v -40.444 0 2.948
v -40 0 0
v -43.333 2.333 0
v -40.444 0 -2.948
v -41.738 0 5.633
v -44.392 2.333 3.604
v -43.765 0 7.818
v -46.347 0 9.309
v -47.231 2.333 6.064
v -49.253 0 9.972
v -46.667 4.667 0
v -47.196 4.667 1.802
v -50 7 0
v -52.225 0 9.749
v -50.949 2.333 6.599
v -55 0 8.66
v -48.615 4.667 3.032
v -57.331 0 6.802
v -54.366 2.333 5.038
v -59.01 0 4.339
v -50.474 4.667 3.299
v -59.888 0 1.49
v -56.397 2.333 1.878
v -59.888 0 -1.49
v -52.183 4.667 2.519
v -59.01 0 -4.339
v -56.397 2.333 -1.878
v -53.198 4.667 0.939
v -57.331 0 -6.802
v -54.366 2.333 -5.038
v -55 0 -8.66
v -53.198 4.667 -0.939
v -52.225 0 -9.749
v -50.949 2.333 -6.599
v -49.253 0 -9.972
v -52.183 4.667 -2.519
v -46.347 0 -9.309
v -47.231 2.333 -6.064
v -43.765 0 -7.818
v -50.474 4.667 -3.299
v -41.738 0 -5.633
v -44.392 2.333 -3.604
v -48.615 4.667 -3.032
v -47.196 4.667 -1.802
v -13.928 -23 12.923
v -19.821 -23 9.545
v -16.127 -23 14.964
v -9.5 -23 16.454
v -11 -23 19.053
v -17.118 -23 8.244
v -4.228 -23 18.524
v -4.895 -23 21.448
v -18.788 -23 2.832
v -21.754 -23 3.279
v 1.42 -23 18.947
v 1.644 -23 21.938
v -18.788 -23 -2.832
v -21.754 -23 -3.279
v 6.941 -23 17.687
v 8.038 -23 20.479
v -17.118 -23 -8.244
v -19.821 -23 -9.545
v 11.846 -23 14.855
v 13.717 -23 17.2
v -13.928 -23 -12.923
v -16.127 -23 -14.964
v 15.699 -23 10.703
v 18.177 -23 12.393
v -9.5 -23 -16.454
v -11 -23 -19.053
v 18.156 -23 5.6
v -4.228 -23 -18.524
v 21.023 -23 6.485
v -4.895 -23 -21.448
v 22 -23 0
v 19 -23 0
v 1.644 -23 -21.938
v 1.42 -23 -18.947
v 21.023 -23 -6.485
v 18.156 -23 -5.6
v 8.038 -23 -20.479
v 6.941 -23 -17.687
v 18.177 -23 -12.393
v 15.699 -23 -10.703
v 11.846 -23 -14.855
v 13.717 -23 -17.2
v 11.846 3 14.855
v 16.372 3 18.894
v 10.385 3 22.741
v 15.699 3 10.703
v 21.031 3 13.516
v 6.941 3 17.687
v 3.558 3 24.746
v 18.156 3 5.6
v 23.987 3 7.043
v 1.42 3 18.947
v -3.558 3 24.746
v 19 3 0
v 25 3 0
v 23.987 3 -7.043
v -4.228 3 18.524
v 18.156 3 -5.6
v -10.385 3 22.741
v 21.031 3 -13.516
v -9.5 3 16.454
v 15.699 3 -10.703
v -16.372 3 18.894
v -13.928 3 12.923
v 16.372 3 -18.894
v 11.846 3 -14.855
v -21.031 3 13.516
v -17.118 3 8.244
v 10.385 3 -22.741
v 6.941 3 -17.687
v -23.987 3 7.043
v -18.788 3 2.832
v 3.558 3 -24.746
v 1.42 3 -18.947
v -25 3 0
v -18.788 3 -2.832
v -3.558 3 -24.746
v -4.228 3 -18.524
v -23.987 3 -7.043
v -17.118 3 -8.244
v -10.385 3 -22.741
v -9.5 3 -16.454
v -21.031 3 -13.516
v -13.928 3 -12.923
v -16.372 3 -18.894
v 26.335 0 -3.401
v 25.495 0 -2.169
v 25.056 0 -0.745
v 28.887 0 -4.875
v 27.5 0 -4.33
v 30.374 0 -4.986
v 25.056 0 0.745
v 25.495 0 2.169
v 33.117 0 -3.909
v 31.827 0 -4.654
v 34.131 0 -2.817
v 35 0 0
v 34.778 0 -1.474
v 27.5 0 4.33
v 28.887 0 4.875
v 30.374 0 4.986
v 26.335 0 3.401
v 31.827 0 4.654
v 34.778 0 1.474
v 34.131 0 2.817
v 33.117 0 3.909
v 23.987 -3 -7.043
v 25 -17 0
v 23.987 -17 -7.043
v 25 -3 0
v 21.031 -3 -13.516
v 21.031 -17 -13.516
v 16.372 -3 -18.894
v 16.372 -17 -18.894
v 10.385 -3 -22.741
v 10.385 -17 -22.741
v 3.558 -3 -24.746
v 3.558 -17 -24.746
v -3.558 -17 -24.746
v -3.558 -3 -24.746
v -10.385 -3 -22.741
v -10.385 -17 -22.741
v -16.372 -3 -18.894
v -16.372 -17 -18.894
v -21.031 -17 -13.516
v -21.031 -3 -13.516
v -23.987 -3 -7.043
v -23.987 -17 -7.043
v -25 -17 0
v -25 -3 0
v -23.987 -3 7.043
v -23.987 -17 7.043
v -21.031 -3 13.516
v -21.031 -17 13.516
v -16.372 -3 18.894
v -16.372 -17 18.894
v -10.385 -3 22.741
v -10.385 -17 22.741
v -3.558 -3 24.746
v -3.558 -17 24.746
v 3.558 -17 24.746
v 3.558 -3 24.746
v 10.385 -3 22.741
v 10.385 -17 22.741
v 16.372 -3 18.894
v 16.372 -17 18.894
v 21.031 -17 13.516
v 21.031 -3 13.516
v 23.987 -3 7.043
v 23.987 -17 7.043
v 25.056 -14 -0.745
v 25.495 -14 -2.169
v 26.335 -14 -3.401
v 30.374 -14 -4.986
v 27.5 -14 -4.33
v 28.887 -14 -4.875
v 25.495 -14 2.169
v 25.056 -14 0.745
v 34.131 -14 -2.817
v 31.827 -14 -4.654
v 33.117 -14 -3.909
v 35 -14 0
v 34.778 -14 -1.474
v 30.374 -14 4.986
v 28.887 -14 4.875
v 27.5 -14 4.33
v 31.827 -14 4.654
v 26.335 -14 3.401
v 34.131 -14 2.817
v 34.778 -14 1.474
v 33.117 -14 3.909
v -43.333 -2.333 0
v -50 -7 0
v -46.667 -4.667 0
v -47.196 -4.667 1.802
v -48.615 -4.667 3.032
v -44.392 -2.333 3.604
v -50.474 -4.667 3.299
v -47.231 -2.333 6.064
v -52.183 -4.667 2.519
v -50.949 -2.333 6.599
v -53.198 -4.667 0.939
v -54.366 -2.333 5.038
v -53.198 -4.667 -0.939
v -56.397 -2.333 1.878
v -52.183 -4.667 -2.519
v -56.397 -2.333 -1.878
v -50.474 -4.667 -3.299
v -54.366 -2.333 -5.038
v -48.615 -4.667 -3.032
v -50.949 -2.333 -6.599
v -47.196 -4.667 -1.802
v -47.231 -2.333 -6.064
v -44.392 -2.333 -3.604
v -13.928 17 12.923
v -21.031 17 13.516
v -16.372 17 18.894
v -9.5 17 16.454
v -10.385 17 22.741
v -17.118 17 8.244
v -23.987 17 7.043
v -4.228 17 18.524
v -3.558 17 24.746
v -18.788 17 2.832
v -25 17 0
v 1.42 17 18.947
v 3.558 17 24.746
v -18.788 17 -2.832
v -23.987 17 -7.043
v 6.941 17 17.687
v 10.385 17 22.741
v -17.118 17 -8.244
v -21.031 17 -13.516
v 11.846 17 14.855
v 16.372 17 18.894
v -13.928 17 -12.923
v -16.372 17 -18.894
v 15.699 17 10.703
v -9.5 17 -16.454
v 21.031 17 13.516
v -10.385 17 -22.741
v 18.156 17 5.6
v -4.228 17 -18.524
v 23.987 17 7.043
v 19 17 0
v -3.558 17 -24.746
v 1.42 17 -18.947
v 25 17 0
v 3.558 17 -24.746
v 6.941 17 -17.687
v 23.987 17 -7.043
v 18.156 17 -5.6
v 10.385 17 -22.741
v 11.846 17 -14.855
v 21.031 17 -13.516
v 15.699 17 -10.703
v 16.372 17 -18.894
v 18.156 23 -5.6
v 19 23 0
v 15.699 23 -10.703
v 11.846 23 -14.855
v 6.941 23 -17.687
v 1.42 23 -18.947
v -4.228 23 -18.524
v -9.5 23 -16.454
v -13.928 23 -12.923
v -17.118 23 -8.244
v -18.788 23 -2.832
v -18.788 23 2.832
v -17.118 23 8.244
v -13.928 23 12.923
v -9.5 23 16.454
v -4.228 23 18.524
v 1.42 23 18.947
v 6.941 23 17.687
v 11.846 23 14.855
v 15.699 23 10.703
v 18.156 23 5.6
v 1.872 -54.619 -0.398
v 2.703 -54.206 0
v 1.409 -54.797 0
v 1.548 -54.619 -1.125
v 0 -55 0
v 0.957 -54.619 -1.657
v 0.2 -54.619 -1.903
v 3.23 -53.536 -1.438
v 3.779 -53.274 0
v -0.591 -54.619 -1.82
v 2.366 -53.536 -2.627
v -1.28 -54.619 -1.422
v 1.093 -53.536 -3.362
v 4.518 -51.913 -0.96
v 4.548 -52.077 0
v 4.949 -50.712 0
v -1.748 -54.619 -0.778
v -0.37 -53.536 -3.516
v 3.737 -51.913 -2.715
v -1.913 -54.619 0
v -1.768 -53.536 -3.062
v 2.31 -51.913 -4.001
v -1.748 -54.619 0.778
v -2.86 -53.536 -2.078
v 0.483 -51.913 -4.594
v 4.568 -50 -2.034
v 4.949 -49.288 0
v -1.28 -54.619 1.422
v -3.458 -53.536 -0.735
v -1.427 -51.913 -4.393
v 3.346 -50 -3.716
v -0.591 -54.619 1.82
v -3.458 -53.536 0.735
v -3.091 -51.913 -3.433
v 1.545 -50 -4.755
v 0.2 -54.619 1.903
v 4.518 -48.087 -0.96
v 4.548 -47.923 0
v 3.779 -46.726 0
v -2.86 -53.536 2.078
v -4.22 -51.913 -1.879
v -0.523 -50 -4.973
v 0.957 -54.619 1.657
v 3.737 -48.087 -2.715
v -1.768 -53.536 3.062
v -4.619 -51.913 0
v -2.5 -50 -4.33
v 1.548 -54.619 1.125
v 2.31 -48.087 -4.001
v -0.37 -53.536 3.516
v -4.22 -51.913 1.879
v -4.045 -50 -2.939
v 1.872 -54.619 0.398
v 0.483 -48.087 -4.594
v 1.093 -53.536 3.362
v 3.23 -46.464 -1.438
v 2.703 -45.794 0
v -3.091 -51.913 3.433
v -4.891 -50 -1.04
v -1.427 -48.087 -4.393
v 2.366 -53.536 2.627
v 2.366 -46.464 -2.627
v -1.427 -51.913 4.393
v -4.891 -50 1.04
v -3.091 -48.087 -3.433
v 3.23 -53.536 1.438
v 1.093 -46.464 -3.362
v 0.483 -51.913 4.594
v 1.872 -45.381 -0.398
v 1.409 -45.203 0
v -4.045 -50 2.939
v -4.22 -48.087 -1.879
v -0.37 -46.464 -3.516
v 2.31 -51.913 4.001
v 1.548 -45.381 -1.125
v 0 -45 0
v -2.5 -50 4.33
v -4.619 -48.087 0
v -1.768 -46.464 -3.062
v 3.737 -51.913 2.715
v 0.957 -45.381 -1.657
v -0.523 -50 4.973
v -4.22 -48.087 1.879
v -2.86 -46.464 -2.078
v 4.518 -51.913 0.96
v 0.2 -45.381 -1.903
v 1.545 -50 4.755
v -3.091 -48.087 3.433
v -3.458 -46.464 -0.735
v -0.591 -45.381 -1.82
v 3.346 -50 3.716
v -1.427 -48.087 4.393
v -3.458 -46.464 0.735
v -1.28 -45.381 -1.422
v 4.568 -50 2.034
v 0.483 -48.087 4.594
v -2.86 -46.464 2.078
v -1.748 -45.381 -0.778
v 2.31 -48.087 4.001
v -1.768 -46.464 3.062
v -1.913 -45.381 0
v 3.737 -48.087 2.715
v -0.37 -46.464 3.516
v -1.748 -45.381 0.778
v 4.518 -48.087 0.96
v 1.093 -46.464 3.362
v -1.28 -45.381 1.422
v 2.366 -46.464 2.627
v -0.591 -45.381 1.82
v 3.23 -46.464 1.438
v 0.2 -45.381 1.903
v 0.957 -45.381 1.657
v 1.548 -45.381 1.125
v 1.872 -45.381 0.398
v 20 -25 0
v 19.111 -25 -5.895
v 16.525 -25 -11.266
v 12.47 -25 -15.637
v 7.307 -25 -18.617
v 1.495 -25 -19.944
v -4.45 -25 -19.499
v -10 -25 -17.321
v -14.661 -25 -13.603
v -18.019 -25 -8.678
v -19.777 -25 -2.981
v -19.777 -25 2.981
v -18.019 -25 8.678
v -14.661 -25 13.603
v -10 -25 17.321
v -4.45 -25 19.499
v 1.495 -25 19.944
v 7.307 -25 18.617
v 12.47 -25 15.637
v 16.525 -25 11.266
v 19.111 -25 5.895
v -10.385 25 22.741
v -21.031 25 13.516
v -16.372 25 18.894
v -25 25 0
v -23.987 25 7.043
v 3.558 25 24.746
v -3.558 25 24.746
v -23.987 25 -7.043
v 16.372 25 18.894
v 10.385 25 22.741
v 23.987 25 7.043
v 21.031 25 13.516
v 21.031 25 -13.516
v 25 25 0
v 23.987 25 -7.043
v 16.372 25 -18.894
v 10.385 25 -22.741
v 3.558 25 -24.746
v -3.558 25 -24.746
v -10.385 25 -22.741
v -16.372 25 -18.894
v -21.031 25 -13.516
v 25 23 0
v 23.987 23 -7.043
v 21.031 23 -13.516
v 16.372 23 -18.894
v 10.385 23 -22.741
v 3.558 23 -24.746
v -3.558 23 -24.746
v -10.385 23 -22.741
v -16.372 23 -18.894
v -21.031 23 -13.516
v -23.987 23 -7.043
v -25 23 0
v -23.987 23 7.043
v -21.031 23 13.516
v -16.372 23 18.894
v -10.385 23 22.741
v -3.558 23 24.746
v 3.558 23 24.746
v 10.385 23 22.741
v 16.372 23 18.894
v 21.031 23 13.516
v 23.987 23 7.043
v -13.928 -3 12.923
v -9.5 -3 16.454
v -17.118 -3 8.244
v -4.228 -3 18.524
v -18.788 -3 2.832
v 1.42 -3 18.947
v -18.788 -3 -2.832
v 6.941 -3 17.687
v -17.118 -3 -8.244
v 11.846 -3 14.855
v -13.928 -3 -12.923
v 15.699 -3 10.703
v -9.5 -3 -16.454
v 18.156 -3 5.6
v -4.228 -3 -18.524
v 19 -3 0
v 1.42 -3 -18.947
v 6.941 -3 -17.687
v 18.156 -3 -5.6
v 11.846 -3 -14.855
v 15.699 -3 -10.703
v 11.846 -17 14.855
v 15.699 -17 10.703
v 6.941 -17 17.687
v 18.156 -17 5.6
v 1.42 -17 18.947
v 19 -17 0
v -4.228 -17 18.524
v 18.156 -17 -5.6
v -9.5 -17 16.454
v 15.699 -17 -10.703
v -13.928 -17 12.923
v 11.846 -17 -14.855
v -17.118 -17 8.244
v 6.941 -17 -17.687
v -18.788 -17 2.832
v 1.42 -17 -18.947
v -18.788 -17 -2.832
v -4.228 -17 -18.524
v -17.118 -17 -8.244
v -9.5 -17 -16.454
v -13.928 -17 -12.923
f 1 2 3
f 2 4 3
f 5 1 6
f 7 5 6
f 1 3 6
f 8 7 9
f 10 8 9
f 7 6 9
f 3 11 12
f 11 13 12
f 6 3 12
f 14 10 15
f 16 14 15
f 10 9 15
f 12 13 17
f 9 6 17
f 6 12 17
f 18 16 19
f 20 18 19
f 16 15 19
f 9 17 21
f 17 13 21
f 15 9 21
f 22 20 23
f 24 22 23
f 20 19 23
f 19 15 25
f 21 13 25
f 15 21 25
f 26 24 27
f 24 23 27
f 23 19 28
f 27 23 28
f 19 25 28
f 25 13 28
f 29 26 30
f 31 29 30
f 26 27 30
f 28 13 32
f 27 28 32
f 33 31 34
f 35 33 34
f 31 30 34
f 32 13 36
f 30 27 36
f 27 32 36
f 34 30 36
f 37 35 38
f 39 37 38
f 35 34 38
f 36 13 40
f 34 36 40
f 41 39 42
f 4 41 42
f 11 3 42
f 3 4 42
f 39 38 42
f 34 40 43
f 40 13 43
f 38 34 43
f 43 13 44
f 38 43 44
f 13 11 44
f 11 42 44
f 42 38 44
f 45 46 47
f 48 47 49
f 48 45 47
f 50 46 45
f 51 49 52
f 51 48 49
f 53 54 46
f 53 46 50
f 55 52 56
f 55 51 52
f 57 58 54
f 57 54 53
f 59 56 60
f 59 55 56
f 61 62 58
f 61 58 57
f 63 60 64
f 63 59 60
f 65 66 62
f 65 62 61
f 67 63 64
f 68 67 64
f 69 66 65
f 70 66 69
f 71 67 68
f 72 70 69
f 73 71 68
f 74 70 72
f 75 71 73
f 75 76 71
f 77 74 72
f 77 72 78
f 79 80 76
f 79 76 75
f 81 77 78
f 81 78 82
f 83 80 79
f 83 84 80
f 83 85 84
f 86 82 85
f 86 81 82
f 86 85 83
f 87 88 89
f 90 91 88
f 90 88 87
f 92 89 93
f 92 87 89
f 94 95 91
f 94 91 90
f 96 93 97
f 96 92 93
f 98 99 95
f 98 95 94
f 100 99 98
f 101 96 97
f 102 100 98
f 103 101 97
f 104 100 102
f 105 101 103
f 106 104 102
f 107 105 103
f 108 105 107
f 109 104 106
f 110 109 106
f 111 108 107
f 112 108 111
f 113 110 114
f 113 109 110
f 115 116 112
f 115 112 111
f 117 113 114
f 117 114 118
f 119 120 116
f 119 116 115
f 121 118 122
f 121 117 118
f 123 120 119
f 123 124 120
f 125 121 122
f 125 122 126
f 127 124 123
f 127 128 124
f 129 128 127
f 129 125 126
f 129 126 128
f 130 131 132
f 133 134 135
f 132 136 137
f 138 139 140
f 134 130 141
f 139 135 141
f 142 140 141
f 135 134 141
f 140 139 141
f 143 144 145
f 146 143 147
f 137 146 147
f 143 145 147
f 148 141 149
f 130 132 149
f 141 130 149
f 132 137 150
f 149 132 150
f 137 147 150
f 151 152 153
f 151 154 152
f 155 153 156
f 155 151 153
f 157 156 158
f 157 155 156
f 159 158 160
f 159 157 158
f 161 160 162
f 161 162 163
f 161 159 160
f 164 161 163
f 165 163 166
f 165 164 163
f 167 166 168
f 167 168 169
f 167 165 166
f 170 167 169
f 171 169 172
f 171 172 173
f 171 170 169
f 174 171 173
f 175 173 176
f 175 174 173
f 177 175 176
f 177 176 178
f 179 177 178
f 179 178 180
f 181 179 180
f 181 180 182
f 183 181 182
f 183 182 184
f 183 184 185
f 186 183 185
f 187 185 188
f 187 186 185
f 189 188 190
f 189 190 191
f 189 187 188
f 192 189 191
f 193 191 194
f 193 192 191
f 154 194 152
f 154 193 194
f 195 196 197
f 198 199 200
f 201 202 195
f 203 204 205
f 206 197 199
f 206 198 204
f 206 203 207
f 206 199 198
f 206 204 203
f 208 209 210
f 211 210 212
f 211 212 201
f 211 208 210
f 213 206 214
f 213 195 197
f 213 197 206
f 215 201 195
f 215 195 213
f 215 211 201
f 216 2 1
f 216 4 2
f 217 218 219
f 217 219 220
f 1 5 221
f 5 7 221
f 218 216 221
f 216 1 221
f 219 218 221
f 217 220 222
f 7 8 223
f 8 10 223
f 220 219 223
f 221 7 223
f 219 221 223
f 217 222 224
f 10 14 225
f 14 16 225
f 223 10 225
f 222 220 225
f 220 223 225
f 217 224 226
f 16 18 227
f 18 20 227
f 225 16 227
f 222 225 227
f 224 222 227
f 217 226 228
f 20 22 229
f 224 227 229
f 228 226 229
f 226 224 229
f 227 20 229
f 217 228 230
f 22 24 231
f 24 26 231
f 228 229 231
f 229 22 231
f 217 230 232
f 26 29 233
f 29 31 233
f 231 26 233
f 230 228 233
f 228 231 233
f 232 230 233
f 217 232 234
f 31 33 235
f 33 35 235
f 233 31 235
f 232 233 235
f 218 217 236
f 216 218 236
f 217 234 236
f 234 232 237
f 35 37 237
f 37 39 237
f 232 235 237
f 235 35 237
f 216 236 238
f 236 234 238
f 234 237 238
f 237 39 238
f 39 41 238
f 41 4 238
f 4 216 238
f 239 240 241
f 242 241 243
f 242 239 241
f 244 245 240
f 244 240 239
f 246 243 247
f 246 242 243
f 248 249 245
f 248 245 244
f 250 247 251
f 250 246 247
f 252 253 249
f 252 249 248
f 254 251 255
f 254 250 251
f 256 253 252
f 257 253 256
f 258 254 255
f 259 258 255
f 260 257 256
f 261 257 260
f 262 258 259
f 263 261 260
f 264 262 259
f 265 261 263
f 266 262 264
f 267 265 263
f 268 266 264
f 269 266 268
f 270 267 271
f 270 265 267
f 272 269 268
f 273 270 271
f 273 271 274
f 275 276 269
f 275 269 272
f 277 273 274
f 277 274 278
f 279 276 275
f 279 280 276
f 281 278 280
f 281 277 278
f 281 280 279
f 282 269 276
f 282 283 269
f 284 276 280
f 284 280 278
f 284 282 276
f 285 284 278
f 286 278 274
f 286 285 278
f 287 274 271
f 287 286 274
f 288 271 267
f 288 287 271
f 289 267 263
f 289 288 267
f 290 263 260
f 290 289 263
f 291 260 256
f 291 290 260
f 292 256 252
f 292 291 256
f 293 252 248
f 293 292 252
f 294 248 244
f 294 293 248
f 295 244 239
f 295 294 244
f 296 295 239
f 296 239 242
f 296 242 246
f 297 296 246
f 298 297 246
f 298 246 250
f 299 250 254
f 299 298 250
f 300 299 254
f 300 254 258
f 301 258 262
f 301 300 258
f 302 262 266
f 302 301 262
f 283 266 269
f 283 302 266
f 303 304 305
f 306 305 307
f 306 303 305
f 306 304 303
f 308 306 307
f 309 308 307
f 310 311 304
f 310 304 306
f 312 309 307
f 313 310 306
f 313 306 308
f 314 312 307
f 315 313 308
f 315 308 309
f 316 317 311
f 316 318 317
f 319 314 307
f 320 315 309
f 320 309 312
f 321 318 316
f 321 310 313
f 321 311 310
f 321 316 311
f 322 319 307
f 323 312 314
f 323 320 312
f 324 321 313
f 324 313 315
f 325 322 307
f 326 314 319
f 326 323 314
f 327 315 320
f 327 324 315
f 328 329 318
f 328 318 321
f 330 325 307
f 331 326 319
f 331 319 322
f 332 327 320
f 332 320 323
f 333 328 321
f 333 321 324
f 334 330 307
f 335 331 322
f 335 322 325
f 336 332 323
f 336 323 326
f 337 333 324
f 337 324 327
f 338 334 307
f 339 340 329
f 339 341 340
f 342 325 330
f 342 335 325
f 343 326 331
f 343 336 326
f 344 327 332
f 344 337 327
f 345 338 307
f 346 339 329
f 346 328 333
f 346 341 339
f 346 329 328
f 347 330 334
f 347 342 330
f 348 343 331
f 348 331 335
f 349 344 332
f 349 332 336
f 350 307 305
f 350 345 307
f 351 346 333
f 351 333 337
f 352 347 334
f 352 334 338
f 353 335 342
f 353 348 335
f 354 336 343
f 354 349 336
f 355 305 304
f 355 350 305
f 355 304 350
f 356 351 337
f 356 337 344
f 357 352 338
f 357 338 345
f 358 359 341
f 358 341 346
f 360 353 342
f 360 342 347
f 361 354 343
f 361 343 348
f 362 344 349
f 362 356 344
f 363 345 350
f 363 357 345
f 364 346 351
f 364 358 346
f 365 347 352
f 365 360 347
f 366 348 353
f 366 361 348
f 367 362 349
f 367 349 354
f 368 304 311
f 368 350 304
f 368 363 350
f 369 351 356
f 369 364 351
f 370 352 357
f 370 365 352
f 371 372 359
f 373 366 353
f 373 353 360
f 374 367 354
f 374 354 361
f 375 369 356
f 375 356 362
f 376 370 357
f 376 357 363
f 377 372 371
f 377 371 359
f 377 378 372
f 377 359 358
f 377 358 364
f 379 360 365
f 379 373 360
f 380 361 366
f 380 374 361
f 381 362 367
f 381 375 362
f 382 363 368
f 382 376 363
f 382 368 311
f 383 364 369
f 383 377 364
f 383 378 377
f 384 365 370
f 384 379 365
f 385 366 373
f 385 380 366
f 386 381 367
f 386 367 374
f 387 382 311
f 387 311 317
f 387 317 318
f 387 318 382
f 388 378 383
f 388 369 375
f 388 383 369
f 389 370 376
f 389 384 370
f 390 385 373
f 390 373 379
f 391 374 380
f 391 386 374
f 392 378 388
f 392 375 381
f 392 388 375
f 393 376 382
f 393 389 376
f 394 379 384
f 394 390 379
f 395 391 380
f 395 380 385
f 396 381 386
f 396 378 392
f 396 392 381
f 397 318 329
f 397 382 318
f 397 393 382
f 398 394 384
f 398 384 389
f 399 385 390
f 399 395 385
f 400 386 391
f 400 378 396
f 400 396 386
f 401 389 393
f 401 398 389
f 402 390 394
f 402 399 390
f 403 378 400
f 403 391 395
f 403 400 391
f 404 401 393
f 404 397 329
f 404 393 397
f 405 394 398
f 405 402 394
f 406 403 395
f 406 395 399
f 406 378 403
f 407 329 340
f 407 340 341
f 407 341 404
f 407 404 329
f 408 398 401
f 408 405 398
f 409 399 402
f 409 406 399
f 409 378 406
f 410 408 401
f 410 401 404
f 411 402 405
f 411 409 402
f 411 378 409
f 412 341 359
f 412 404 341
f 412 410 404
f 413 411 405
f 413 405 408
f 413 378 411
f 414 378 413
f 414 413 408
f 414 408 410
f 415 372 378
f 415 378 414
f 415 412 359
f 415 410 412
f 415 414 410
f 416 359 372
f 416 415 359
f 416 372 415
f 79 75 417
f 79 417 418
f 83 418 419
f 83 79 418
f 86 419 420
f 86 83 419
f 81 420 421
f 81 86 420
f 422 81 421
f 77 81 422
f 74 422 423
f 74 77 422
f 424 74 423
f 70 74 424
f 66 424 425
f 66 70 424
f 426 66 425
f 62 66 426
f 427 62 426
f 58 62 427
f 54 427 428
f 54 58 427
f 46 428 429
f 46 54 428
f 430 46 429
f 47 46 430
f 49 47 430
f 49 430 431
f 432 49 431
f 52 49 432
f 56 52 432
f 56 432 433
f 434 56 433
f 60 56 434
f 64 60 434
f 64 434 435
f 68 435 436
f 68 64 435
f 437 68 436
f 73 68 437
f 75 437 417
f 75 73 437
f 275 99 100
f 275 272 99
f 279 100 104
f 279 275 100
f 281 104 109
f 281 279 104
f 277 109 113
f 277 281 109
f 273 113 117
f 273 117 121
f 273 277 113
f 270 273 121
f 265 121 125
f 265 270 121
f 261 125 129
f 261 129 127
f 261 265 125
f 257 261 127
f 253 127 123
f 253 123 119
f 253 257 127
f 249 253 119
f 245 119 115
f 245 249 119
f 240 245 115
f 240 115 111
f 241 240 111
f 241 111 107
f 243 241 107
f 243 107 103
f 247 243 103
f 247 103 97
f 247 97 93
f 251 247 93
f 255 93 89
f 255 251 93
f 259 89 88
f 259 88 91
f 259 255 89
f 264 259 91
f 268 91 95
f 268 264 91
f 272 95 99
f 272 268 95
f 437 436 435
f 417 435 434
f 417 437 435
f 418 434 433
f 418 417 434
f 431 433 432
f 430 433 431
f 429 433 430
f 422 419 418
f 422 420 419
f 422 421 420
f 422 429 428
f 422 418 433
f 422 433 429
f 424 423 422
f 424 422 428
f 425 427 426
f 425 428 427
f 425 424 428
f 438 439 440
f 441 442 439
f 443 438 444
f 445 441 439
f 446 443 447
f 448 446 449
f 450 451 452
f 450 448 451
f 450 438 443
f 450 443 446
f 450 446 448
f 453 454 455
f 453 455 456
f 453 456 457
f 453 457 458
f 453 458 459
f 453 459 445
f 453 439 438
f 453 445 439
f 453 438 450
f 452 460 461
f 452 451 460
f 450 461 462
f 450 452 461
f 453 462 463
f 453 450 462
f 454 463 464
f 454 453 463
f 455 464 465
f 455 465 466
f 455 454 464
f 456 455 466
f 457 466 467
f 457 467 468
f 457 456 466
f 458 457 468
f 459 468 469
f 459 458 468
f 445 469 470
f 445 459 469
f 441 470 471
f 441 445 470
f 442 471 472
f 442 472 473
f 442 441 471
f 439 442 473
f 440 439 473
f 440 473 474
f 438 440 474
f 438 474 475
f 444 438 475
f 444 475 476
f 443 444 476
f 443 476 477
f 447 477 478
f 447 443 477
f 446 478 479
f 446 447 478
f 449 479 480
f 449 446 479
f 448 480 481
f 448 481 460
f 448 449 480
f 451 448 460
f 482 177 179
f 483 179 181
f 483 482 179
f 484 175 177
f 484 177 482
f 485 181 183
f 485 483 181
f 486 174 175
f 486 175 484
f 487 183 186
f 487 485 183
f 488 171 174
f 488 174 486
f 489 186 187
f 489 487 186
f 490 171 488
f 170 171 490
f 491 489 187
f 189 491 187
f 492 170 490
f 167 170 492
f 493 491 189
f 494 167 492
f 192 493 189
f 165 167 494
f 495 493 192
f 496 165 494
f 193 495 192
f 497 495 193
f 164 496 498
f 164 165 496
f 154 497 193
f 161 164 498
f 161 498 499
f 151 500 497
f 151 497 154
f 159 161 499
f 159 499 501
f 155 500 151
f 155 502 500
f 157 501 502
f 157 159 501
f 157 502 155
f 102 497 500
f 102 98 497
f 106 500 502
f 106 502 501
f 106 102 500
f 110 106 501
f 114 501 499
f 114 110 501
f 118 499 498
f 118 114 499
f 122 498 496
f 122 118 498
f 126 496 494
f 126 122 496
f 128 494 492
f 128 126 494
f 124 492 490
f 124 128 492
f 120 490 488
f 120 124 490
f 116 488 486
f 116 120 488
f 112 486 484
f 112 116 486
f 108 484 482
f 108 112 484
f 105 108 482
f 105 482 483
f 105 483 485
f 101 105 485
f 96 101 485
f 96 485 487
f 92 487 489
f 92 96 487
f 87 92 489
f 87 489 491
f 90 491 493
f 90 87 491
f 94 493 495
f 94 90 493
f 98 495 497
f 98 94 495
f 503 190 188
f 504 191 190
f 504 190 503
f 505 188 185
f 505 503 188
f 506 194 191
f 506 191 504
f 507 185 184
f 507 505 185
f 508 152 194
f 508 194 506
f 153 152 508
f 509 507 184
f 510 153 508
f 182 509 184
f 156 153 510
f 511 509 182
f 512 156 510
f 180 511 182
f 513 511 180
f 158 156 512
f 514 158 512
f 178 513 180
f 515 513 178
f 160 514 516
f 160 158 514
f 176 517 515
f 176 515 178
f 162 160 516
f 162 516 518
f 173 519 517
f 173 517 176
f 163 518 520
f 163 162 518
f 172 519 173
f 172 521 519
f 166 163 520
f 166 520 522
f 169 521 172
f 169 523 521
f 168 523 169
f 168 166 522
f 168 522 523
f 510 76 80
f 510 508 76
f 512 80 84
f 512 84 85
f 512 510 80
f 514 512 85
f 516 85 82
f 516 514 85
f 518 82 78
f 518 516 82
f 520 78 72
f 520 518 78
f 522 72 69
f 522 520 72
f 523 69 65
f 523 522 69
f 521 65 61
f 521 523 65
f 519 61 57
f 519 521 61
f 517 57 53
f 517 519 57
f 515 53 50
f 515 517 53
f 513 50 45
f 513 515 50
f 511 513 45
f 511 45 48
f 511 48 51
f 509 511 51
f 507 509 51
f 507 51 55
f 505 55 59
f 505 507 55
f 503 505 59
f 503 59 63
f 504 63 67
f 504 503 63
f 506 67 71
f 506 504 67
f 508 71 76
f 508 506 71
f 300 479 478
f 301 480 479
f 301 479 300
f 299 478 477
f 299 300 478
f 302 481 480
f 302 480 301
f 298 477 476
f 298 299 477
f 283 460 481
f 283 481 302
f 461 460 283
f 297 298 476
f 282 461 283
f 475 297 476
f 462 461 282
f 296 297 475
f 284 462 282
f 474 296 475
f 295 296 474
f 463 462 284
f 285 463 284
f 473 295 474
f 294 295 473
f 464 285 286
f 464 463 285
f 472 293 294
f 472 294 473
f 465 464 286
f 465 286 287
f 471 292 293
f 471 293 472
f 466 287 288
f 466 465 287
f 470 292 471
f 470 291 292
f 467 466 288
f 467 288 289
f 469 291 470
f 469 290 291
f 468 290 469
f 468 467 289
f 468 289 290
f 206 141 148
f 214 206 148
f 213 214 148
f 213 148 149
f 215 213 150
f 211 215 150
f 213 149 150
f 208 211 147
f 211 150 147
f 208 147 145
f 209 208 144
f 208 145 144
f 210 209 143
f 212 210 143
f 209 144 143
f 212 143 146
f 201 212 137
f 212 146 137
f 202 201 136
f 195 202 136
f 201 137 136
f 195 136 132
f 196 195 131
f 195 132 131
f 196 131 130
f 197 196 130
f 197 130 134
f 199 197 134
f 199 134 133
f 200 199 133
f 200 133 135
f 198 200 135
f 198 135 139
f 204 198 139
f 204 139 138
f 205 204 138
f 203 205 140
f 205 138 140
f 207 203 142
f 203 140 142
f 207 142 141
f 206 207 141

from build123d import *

# Parameters (mm, degrees)
F0_R     = 25
F1_DEPTH = 25
F5_R     = 5
F6_DEPTH = 14


# Not quite as in the source:
# - a fillet or chamfer that OpenCascade refuses, or shapes differently, is made with other operations: its cross-section is extruded or revolved along the edge and cut away or added


with BuildPart() as f1:
    # F0 (on Front) → F1 (new body, symmetric)
    with BuildSketch(Plane.XZ):
        Circle(F0_R)
    extrude(amount=F1_DEPTH, both=True)


with BuildPart() as f3:
    # F2 (on Top) → F3 (revolve)
    with BuildSketch(Plane.XY):
        Polygon((0, 25), (0, -25), (25, -25), (25, -23), (19, -23), (19, -17), (25, -17), (25, -3), (19, -3), (19, 3), (25, 3), (25, 17), (19, 17), (19, 23), (25, 23), (25, 25), align=None)
    revolve(axis=Axis((0, 0, 0), (0, 1, 0)))

    # F9: chamfer of 5 on 1 edges, made by hand

    # F9_s1 → F9_t2 (revolve, cut)
    with BuildSketch(Plane.XY):
        Polygon((20, -25), (25, -20), (25, -25), align=None)
    revolve(axis=Axis((0, -25, 0), (0, 1, 0)), mode=Mode.SUBTRACT)


with BuildPart() as f6:
    # F5 (on Front) → F6 (new body)
    with BuildSketch(Plane.XZ):
        with Locations((30, 0)):
            Circle(F5_R)
    extrude(amount=F6_DEPTH)


with BuildPart() as f8:
    # F7 (on Top) → F8 (revolve)
    with BuildSketch(Plane.XY):
        with BuildLine():
            ThreePointArc((0, -55), (5, -50), (0, -45))
            Line((0, -45), (0, -55))
        make_face()
    revolve(axis=Axis((0, -50, 0), (0, 1, 0)))


with BuildPart() as f11:
    # F10 (on Top) → F11 (revolve)
    with BuildSketch(Plane.XY):
        Polygon((-50, 7), (-50, 0), (-50, -7), (-40, 0), align=None)
    revolve(axis=Axis((-50, -3.5, 0), (0, -1, 0)))


solid = Compound([f3.part, f6.part, f8.part, f11.part])
